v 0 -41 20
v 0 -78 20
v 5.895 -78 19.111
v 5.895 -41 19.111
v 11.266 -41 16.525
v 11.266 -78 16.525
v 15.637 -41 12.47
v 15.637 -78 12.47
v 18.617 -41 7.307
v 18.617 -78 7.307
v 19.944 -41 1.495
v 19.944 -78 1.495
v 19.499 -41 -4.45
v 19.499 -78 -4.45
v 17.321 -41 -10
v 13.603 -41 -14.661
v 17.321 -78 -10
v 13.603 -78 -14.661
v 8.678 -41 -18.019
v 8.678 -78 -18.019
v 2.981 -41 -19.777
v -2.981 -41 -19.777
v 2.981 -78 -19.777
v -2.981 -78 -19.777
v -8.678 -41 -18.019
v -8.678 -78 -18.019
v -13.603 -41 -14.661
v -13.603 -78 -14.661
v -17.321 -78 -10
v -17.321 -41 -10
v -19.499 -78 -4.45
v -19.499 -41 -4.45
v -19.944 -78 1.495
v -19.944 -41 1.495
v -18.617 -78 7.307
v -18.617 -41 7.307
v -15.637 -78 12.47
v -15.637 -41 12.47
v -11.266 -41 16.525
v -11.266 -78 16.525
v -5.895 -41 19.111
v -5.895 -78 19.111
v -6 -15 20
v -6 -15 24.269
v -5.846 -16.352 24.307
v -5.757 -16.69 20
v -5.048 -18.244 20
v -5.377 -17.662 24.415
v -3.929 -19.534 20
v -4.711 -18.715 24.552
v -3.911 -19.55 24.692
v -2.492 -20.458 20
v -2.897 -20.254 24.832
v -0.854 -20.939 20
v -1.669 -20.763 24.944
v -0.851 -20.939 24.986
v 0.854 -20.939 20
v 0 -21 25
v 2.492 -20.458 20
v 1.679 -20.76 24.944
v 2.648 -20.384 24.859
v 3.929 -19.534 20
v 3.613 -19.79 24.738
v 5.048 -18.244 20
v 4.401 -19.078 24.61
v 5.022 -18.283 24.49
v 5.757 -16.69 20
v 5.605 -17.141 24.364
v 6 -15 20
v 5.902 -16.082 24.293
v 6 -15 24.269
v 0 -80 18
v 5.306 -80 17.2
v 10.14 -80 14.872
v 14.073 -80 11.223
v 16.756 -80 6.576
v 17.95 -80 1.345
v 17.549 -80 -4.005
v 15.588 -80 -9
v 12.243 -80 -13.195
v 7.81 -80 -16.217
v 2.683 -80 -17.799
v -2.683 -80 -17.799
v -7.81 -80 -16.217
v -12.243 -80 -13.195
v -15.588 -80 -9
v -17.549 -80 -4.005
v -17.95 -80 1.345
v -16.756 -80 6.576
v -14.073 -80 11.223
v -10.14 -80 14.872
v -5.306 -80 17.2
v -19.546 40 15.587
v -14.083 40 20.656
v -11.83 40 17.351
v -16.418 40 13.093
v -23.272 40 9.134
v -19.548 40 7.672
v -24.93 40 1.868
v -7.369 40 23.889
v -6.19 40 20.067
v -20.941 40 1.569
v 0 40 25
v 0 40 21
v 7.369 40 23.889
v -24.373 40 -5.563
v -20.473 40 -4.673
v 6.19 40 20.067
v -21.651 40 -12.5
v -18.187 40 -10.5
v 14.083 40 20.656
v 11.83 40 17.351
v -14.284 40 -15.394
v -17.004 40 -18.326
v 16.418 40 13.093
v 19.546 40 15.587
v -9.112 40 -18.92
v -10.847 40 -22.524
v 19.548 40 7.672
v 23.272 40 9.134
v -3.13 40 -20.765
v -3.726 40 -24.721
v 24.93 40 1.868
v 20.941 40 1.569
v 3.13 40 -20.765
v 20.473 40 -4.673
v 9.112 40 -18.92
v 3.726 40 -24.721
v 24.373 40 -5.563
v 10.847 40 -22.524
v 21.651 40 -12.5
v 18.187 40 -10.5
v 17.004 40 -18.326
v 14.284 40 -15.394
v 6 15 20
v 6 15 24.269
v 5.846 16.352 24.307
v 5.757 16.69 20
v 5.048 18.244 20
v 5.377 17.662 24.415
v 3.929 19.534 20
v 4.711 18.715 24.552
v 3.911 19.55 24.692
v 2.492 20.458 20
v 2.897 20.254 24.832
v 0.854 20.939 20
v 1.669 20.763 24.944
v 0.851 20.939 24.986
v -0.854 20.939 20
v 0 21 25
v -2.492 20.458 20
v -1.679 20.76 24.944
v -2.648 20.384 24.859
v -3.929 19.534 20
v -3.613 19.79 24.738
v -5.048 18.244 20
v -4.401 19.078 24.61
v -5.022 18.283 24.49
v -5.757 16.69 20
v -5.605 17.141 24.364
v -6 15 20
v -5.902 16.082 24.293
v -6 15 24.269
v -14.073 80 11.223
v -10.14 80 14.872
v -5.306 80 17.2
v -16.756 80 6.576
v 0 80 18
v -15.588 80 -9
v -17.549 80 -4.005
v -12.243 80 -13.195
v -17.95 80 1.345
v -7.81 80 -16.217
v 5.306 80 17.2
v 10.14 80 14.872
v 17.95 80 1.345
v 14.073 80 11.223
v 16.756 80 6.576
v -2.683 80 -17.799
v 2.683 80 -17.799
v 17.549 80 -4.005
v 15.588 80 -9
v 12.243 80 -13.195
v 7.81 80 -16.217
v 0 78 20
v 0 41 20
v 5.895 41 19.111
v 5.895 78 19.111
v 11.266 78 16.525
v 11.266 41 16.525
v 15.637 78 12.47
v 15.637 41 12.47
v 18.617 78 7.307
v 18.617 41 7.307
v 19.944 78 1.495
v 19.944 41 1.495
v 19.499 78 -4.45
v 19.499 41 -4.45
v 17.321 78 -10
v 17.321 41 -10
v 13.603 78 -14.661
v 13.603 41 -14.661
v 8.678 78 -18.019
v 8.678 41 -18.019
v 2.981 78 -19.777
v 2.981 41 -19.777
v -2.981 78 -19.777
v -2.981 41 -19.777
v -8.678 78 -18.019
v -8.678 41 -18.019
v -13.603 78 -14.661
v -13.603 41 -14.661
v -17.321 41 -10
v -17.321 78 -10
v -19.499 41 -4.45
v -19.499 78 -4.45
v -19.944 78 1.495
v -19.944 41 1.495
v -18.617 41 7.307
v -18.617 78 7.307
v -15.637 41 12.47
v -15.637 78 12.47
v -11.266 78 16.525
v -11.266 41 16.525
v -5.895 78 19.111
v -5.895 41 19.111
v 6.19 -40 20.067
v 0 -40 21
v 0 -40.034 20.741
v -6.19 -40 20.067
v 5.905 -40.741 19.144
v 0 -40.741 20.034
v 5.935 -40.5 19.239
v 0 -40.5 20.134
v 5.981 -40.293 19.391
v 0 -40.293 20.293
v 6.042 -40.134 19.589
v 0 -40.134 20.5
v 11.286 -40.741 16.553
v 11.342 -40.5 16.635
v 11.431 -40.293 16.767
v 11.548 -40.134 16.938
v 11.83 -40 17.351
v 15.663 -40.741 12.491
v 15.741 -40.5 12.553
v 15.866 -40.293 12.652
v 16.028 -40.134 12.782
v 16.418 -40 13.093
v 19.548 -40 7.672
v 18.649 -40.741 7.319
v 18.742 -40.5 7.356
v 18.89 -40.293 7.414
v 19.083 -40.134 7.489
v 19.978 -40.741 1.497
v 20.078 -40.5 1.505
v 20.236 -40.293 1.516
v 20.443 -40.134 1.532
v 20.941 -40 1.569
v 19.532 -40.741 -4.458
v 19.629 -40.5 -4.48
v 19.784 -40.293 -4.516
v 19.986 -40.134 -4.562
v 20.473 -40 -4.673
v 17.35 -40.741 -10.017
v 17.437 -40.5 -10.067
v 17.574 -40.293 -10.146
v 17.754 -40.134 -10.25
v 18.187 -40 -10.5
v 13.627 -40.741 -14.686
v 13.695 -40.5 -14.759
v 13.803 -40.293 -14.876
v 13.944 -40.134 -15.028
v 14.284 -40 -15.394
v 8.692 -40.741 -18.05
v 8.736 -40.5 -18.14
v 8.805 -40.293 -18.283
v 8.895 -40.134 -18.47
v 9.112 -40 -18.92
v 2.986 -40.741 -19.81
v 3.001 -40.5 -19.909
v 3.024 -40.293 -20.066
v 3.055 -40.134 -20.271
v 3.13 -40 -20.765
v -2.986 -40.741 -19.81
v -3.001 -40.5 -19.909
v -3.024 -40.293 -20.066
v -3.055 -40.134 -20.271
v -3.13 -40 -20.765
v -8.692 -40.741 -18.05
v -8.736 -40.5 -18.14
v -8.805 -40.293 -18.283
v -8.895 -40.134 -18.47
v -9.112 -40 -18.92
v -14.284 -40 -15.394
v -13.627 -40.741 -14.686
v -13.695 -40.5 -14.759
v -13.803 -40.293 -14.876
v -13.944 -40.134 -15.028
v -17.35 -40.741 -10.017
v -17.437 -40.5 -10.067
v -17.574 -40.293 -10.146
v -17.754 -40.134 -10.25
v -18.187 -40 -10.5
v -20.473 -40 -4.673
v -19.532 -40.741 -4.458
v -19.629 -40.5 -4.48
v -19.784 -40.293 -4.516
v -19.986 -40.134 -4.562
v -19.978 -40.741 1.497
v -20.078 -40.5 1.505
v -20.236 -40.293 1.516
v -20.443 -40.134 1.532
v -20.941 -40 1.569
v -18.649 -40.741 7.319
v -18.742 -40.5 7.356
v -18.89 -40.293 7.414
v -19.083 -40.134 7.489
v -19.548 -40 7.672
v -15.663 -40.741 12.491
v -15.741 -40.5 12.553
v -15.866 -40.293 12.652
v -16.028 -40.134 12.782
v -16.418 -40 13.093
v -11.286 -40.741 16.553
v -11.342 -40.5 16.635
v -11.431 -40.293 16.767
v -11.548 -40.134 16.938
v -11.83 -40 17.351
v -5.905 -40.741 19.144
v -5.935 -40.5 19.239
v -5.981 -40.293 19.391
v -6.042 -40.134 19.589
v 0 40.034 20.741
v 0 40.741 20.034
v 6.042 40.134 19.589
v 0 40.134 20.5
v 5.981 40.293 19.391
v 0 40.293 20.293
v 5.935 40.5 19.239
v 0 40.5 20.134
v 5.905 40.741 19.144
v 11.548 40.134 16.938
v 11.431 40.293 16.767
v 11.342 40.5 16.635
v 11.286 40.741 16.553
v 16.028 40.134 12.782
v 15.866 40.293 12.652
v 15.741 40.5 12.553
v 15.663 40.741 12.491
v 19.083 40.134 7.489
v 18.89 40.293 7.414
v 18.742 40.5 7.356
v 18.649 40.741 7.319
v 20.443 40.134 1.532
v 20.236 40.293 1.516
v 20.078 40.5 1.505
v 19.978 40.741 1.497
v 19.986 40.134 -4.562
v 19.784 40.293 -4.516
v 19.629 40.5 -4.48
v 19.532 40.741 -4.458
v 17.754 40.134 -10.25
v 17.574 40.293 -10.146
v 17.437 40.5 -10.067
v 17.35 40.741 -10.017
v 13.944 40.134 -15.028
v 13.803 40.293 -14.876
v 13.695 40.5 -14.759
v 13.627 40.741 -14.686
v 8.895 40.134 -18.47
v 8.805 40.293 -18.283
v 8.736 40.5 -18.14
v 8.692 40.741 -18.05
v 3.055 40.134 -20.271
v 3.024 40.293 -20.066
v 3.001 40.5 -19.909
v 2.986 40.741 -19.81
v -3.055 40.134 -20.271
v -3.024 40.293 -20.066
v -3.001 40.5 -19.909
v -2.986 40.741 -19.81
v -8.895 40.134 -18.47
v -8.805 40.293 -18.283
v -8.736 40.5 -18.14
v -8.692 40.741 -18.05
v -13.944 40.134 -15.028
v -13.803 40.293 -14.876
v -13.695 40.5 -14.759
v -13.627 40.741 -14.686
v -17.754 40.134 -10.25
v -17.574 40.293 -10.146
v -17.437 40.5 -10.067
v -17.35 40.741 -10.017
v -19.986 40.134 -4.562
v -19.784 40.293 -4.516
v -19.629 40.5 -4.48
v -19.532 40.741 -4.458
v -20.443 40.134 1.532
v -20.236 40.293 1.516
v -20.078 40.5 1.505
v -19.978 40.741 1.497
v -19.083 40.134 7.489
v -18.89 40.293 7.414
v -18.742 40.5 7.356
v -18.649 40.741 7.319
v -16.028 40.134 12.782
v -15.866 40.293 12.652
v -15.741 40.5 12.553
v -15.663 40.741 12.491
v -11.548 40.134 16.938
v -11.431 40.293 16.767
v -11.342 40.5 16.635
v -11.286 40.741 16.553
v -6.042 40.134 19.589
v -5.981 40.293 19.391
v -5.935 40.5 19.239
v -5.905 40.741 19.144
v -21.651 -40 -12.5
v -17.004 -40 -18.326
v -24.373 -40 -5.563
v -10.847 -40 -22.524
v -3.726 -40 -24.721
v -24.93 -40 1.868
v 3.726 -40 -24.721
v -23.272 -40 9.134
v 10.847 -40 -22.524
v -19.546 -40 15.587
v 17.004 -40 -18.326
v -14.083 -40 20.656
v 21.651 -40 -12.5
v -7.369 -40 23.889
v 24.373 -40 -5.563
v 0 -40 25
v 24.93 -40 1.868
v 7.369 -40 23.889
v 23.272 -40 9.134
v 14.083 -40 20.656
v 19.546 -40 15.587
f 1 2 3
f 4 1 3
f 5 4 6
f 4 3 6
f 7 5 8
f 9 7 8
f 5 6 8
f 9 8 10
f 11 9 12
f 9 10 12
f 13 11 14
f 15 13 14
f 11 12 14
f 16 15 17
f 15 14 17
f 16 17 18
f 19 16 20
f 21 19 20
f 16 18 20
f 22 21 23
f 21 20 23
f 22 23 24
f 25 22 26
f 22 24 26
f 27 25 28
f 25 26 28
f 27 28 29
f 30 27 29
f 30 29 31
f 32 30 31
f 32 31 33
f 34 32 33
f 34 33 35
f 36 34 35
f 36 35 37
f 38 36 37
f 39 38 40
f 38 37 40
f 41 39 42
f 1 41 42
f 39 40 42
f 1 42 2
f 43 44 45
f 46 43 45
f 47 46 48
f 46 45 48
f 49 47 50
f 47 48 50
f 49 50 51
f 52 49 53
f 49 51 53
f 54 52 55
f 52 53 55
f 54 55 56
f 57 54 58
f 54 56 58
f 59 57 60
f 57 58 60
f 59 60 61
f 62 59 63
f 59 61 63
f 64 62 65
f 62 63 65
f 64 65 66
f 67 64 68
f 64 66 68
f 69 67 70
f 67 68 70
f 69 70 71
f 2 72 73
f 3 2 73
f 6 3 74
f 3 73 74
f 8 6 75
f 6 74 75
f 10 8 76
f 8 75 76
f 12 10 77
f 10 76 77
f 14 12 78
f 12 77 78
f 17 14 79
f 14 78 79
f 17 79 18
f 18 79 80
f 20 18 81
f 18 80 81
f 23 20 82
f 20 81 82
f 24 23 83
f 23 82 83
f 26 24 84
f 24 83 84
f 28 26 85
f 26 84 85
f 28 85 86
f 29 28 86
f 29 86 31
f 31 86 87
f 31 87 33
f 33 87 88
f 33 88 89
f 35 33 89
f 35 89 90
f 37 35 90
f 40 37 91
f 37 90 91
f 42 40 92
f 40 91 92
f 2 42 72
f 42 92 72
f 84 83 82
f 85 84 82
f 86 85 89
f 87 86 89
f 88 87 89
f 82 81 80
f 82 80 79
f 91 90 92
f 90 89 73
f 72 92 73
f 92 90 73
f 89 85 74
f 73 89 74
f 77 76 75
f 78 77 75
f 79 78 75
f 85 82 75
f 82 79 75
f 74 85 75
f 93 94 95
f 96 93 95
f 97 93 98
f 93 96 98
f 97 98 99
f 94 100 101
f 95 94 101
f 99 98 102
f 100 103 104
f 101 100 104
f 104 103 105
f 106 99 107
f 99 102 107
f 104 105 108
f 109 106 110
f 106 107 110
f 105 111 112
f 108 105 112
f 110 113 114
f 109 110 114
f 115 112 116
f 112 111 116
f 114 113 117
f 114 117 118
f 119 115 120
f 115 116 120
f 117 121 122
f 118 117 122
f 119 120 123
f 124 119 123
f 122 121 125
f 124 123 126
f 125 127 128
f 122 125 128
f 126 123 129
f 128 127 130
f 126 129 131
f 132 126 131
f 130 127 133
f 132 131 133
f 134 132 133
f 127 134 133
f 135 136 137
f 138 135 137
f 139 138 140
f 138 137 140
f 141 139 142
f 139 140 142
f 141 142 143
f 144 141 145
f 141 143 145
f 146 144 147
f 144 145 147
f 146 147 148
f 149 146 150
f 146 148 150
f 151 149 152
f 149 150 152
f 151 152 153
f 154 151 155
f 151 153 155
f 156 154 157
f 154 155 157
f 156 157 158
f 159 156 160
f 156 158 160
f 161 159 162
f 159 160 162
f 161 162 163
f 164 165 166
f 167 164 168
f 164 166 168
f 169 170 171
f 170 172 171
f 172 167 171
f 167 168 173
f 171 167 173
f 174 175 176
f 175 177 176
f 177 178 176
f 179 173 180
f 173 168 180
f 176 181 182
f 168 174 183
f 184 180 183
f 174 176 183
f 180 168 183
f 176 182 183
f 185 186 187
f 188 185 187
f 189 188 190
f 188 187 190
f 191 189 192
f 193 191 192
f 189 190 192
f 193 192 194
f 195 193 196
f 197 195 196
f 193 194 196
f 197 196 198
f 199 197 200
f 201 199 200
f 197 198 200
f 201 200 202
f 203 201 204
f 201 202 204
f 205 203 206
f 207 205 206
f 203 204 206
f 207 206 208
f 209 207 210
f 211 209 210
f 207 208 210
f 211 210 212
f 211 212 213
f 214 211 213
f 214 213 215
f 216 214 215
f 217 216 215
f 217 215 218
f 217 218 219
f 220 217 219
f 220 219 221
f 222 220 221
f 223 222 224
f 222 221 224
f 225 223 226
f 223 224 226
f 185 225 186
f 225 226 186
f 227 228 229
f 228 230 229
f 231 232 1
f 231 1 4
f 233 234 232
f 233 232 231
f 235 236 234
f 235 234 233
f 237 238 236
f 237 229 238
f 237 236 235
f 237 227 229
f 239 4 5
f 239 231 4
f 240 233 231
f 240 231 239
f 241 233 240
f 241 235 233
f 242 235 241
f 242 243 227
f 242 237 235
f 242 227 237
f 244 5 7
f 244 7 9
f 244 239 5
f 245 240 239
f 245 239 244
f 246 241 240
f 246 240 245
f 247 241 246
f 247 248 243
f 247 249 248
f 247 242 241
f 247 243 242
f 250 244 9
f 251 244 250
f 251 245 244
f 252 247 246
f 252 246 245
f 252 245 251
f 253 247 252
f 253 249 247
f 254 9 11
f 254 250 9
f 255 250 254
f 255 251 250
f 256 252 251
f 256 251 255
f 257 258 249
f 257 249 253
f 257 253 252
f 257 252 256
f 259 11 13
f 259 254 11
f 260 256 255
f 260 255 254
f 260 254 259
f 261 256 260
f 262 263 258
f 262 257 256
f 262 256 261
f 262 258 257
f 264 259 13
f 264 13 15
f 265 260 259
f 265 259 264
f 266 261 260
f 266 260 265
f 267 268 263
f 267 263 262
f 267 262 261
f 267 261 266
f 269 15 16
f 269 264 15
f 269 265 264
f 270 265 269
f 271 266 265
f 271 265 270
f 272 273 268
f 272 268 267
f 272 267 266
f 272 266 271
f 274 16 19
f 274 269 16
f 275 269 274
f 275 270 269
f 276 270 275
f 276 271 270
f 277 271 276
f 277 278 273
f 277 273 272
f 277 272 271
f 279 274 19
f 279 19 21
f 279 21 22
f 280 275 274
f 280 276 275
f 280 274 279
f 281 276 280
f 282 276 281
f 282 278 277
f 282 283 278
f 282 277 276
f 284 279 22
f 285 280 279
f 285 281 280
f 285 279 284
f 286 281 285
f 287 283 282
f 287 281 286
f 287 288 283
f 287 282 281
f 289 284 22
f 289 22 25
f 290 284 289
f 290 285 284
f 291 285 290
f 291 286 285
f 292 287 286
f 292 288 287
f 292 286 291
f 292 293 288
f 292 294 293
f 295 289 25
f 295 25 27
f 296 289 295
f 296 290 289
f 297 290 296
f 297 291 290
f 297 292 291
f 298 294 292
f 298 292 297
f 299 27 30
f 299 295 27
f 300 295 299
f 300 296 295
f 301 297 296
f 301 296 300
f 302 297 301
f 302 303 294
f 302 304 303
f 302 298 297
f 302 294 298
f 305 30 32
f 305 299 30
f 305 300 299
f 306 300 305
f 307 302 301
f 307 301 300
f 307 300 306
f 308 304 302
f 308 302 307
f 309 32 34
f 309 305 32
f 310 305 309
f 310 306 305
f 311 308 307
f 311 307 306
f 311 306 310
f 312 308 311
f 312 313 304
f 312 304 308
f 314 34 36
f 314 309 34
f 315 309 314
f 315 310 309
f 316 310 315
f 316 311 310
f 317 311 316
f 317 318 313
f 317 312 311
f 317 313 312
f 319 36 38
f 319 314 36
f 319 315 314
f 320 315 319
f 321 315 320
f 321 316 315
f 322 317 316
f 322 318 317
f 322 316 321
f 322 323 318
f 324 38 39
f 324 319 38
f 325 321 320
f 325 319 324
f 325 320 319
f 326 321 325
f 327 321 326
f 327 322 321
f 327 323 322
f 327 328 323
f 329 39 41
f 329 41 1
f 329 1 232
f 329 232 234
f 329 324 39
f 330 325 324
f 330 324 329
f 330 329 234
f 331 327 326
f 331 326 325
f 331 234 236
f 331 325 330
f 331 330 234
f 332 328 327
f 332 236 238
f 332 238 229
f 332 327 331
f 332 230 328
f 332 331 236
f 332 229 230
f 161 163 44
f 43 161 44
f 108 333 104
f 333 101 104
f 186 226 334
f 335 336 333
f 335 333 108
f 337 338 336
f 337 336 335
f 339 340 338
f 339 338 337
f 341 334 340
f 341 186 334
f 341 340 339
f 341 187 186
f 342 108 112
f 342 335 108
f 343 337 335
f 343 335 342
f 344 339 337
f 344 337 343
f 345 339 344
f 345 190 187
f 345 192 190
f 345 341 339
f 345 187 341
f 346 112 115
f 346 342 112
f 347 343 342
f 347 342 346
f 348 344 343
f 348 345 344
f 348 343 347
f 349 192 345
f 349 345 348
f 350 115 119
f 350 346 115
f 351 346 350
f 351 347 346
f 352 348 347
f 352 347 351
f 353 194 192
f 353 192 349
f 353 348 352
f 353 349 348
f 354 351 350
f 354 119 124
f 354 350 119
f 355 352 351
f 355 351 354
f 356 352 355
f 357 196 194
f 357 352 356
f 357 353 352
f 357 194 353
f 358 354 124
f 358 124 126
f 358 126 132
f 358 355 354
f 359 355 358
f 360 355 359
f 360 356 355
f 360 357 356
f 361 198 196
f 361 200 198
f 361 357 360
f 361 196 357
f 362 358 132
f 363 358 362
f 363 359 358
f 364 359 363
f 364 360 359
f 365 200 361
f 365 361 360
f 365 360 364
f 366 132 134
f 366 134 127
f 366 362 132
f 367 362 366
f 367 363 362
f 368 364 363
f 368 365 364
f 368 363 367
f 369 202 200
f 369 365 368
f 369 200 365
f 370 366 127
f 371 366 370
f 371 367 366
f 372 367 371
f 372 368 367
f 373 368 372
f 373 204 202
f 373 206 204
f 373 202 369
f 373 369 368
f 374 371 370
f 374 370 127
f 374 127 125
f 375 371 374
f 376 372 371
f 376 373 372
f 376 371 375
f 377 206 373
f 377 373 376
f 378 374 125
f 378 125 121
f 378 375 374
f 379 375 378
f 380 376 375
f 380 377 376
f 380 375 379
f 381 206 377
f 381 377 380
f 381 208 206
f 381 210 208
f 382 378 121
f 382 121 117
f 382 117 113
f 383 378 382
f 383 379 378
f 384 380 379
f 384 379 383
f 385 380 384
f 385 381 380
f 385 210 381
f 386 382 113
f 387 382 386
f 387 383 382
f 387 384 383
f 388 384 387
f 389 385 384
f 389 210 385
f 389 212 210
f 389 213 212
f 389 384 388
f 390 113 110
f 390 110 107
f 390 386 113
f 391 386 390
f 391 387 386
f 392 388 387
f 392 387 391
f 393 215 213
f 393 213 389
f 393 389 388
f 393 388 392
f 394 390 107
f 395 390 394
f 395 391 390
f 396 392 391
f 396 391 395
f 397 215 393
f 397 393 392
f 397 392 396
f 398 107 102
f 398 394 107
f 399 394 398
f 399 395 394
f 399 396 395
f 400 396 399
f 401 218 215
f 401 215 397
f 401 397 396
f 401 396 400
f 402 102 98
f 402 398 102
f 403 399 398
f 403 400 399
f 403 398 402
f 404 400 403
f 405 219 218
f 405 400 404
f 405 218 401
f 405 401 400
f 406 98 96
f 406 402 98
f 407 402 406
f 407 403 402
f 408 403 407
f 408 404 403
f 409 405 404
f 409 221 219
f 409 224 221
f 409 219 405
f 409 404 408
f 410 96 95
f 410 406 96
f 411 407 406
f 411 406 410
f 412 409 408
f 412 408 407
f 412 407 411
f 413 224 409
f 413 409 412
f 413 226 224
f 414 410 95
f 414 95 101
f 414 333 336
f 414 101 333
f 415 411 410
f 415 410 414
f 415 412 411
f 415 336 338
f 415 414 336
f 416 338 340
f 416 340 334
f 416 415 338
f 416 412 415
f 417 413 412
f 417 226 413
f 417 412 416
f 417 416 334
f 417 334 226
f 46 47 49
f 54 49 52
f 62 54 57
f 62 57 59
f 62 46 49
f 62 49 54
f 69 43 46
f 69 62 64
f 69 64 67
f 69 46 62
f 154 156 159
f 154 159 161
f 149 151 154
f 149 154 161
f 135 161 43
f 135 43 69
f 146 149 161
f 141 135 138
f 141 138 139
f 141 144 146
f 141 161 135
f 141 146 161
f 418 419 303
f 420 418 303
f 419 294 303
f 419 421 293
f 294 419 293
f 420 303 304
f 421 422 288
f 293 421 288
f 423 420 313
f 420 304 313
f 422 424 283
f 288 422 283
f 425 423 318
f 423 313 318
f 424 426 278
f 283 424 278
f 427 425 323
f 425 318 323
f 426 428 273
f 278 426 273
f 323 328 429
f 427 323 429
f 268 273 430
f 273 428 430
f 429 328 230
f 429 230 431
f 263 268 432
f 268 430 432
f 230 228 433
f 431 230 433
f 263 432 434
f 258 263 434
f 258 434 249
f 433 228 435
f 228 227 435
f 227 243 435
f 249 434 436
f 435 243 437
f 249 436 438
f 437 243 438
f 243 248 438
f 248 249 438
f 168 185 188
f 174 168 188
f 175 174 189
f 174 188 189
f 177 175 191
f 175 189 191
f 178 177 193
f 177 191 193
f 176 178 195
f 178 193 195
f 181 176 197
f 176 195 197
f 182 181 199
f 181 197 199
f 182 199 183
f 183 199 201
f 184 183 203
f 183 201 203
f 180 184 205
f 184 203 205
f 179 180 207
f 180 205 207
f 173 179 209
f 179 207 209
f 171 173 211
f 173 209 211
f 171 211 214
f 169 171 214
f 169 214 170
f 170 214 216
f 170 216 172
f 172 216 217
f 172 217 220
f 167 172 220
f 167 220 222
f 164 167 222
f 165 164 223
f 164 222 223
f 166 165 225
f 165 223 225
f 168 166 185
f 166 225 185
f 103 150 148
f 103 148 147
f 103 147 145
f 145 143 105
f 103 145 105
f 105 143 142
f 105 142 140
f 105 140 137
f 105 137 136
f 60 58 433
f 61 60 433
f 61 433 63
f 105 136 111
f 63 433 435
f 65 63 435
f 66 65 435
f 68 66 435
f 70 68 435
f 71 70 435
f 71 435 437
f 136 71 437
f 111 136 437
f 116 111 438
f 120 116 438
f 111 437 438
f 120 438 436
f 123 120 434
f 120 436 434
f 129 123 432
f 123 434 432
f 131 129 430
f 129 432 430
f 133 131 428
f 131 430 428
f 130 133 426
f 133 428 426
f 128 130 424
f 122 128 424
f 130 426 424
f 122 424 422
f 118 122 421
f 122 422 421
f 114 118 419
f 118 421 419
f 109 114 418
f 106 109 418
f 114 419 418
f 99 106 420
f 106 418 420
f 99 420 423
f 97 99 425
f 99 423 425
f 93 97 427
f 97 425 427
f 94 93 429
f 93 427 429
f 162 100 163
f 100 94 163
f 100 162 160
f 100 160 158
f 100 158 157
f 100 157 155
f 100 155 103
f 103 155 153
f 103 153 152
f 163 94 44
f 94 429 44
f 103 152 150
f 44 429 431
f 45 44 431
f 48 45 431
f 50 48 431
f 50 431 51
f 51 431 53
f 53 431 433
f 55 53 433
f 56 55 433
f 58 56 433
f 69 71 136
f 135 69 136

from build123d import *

# Parameters (mm, degrees)
F2_SIZE  = 2
F3_R     = 1
F4_R     = 1
F7_DEPTH = 5


with BuildPart() as f1:
    # F0 (on Right) → F1 (revolve)
    with BuildSketch(Plane.YZ):
        Polygon((0, 25), (-40, 25), (-40, 20), (-80, 20), (-80, 0), (80, 0), (80, 20), (40, 20), (40, 25), align=None)
    revolve(axis=Axis((0, 1.564302, 0), (0, 1, 0)))

    # F2
    f2_edges = [f1.edges().sort_by_distance(p)[0] for p in [
        (0, -80, -20),
        (0, 80, -20),
    ]]
    chamfer(f2_edges, length=F2_SIZE)

    # F3
    f3_edges = [f1.edges().sort_by_distance(p)[0] for p in [
        (0, -40, -20),
    ]]
    fillet(f3_edges, radius=F3_R)

    # F4
    f4_edges = [f1.edges().sort_by_distance(p)[0] for p in [
        (0, 40, -20),
    ]]
    fillet(f4_edges, radius=F4_R)

    # F6 (on offset) → F7 (cut)
    with BuildSketch(Plane.XY.offset(25)):
        with BuildLine():
            Line((-6, 15), (-6, 0))
            Line((-6, 0), (-6, -15))
            ThreePointArc((-6, -15), (0, -21), (6, -15))
            Line((6, -15), (6, 0))
            Line((6, 0), (6, 15))
            ThreePointArc((6, 15), (0, 21), (-6, 15))
        make_face()
    extrude(amount=-F7_DEPTH, mode=Mode.SUBTRACT)


solid = f1.part
